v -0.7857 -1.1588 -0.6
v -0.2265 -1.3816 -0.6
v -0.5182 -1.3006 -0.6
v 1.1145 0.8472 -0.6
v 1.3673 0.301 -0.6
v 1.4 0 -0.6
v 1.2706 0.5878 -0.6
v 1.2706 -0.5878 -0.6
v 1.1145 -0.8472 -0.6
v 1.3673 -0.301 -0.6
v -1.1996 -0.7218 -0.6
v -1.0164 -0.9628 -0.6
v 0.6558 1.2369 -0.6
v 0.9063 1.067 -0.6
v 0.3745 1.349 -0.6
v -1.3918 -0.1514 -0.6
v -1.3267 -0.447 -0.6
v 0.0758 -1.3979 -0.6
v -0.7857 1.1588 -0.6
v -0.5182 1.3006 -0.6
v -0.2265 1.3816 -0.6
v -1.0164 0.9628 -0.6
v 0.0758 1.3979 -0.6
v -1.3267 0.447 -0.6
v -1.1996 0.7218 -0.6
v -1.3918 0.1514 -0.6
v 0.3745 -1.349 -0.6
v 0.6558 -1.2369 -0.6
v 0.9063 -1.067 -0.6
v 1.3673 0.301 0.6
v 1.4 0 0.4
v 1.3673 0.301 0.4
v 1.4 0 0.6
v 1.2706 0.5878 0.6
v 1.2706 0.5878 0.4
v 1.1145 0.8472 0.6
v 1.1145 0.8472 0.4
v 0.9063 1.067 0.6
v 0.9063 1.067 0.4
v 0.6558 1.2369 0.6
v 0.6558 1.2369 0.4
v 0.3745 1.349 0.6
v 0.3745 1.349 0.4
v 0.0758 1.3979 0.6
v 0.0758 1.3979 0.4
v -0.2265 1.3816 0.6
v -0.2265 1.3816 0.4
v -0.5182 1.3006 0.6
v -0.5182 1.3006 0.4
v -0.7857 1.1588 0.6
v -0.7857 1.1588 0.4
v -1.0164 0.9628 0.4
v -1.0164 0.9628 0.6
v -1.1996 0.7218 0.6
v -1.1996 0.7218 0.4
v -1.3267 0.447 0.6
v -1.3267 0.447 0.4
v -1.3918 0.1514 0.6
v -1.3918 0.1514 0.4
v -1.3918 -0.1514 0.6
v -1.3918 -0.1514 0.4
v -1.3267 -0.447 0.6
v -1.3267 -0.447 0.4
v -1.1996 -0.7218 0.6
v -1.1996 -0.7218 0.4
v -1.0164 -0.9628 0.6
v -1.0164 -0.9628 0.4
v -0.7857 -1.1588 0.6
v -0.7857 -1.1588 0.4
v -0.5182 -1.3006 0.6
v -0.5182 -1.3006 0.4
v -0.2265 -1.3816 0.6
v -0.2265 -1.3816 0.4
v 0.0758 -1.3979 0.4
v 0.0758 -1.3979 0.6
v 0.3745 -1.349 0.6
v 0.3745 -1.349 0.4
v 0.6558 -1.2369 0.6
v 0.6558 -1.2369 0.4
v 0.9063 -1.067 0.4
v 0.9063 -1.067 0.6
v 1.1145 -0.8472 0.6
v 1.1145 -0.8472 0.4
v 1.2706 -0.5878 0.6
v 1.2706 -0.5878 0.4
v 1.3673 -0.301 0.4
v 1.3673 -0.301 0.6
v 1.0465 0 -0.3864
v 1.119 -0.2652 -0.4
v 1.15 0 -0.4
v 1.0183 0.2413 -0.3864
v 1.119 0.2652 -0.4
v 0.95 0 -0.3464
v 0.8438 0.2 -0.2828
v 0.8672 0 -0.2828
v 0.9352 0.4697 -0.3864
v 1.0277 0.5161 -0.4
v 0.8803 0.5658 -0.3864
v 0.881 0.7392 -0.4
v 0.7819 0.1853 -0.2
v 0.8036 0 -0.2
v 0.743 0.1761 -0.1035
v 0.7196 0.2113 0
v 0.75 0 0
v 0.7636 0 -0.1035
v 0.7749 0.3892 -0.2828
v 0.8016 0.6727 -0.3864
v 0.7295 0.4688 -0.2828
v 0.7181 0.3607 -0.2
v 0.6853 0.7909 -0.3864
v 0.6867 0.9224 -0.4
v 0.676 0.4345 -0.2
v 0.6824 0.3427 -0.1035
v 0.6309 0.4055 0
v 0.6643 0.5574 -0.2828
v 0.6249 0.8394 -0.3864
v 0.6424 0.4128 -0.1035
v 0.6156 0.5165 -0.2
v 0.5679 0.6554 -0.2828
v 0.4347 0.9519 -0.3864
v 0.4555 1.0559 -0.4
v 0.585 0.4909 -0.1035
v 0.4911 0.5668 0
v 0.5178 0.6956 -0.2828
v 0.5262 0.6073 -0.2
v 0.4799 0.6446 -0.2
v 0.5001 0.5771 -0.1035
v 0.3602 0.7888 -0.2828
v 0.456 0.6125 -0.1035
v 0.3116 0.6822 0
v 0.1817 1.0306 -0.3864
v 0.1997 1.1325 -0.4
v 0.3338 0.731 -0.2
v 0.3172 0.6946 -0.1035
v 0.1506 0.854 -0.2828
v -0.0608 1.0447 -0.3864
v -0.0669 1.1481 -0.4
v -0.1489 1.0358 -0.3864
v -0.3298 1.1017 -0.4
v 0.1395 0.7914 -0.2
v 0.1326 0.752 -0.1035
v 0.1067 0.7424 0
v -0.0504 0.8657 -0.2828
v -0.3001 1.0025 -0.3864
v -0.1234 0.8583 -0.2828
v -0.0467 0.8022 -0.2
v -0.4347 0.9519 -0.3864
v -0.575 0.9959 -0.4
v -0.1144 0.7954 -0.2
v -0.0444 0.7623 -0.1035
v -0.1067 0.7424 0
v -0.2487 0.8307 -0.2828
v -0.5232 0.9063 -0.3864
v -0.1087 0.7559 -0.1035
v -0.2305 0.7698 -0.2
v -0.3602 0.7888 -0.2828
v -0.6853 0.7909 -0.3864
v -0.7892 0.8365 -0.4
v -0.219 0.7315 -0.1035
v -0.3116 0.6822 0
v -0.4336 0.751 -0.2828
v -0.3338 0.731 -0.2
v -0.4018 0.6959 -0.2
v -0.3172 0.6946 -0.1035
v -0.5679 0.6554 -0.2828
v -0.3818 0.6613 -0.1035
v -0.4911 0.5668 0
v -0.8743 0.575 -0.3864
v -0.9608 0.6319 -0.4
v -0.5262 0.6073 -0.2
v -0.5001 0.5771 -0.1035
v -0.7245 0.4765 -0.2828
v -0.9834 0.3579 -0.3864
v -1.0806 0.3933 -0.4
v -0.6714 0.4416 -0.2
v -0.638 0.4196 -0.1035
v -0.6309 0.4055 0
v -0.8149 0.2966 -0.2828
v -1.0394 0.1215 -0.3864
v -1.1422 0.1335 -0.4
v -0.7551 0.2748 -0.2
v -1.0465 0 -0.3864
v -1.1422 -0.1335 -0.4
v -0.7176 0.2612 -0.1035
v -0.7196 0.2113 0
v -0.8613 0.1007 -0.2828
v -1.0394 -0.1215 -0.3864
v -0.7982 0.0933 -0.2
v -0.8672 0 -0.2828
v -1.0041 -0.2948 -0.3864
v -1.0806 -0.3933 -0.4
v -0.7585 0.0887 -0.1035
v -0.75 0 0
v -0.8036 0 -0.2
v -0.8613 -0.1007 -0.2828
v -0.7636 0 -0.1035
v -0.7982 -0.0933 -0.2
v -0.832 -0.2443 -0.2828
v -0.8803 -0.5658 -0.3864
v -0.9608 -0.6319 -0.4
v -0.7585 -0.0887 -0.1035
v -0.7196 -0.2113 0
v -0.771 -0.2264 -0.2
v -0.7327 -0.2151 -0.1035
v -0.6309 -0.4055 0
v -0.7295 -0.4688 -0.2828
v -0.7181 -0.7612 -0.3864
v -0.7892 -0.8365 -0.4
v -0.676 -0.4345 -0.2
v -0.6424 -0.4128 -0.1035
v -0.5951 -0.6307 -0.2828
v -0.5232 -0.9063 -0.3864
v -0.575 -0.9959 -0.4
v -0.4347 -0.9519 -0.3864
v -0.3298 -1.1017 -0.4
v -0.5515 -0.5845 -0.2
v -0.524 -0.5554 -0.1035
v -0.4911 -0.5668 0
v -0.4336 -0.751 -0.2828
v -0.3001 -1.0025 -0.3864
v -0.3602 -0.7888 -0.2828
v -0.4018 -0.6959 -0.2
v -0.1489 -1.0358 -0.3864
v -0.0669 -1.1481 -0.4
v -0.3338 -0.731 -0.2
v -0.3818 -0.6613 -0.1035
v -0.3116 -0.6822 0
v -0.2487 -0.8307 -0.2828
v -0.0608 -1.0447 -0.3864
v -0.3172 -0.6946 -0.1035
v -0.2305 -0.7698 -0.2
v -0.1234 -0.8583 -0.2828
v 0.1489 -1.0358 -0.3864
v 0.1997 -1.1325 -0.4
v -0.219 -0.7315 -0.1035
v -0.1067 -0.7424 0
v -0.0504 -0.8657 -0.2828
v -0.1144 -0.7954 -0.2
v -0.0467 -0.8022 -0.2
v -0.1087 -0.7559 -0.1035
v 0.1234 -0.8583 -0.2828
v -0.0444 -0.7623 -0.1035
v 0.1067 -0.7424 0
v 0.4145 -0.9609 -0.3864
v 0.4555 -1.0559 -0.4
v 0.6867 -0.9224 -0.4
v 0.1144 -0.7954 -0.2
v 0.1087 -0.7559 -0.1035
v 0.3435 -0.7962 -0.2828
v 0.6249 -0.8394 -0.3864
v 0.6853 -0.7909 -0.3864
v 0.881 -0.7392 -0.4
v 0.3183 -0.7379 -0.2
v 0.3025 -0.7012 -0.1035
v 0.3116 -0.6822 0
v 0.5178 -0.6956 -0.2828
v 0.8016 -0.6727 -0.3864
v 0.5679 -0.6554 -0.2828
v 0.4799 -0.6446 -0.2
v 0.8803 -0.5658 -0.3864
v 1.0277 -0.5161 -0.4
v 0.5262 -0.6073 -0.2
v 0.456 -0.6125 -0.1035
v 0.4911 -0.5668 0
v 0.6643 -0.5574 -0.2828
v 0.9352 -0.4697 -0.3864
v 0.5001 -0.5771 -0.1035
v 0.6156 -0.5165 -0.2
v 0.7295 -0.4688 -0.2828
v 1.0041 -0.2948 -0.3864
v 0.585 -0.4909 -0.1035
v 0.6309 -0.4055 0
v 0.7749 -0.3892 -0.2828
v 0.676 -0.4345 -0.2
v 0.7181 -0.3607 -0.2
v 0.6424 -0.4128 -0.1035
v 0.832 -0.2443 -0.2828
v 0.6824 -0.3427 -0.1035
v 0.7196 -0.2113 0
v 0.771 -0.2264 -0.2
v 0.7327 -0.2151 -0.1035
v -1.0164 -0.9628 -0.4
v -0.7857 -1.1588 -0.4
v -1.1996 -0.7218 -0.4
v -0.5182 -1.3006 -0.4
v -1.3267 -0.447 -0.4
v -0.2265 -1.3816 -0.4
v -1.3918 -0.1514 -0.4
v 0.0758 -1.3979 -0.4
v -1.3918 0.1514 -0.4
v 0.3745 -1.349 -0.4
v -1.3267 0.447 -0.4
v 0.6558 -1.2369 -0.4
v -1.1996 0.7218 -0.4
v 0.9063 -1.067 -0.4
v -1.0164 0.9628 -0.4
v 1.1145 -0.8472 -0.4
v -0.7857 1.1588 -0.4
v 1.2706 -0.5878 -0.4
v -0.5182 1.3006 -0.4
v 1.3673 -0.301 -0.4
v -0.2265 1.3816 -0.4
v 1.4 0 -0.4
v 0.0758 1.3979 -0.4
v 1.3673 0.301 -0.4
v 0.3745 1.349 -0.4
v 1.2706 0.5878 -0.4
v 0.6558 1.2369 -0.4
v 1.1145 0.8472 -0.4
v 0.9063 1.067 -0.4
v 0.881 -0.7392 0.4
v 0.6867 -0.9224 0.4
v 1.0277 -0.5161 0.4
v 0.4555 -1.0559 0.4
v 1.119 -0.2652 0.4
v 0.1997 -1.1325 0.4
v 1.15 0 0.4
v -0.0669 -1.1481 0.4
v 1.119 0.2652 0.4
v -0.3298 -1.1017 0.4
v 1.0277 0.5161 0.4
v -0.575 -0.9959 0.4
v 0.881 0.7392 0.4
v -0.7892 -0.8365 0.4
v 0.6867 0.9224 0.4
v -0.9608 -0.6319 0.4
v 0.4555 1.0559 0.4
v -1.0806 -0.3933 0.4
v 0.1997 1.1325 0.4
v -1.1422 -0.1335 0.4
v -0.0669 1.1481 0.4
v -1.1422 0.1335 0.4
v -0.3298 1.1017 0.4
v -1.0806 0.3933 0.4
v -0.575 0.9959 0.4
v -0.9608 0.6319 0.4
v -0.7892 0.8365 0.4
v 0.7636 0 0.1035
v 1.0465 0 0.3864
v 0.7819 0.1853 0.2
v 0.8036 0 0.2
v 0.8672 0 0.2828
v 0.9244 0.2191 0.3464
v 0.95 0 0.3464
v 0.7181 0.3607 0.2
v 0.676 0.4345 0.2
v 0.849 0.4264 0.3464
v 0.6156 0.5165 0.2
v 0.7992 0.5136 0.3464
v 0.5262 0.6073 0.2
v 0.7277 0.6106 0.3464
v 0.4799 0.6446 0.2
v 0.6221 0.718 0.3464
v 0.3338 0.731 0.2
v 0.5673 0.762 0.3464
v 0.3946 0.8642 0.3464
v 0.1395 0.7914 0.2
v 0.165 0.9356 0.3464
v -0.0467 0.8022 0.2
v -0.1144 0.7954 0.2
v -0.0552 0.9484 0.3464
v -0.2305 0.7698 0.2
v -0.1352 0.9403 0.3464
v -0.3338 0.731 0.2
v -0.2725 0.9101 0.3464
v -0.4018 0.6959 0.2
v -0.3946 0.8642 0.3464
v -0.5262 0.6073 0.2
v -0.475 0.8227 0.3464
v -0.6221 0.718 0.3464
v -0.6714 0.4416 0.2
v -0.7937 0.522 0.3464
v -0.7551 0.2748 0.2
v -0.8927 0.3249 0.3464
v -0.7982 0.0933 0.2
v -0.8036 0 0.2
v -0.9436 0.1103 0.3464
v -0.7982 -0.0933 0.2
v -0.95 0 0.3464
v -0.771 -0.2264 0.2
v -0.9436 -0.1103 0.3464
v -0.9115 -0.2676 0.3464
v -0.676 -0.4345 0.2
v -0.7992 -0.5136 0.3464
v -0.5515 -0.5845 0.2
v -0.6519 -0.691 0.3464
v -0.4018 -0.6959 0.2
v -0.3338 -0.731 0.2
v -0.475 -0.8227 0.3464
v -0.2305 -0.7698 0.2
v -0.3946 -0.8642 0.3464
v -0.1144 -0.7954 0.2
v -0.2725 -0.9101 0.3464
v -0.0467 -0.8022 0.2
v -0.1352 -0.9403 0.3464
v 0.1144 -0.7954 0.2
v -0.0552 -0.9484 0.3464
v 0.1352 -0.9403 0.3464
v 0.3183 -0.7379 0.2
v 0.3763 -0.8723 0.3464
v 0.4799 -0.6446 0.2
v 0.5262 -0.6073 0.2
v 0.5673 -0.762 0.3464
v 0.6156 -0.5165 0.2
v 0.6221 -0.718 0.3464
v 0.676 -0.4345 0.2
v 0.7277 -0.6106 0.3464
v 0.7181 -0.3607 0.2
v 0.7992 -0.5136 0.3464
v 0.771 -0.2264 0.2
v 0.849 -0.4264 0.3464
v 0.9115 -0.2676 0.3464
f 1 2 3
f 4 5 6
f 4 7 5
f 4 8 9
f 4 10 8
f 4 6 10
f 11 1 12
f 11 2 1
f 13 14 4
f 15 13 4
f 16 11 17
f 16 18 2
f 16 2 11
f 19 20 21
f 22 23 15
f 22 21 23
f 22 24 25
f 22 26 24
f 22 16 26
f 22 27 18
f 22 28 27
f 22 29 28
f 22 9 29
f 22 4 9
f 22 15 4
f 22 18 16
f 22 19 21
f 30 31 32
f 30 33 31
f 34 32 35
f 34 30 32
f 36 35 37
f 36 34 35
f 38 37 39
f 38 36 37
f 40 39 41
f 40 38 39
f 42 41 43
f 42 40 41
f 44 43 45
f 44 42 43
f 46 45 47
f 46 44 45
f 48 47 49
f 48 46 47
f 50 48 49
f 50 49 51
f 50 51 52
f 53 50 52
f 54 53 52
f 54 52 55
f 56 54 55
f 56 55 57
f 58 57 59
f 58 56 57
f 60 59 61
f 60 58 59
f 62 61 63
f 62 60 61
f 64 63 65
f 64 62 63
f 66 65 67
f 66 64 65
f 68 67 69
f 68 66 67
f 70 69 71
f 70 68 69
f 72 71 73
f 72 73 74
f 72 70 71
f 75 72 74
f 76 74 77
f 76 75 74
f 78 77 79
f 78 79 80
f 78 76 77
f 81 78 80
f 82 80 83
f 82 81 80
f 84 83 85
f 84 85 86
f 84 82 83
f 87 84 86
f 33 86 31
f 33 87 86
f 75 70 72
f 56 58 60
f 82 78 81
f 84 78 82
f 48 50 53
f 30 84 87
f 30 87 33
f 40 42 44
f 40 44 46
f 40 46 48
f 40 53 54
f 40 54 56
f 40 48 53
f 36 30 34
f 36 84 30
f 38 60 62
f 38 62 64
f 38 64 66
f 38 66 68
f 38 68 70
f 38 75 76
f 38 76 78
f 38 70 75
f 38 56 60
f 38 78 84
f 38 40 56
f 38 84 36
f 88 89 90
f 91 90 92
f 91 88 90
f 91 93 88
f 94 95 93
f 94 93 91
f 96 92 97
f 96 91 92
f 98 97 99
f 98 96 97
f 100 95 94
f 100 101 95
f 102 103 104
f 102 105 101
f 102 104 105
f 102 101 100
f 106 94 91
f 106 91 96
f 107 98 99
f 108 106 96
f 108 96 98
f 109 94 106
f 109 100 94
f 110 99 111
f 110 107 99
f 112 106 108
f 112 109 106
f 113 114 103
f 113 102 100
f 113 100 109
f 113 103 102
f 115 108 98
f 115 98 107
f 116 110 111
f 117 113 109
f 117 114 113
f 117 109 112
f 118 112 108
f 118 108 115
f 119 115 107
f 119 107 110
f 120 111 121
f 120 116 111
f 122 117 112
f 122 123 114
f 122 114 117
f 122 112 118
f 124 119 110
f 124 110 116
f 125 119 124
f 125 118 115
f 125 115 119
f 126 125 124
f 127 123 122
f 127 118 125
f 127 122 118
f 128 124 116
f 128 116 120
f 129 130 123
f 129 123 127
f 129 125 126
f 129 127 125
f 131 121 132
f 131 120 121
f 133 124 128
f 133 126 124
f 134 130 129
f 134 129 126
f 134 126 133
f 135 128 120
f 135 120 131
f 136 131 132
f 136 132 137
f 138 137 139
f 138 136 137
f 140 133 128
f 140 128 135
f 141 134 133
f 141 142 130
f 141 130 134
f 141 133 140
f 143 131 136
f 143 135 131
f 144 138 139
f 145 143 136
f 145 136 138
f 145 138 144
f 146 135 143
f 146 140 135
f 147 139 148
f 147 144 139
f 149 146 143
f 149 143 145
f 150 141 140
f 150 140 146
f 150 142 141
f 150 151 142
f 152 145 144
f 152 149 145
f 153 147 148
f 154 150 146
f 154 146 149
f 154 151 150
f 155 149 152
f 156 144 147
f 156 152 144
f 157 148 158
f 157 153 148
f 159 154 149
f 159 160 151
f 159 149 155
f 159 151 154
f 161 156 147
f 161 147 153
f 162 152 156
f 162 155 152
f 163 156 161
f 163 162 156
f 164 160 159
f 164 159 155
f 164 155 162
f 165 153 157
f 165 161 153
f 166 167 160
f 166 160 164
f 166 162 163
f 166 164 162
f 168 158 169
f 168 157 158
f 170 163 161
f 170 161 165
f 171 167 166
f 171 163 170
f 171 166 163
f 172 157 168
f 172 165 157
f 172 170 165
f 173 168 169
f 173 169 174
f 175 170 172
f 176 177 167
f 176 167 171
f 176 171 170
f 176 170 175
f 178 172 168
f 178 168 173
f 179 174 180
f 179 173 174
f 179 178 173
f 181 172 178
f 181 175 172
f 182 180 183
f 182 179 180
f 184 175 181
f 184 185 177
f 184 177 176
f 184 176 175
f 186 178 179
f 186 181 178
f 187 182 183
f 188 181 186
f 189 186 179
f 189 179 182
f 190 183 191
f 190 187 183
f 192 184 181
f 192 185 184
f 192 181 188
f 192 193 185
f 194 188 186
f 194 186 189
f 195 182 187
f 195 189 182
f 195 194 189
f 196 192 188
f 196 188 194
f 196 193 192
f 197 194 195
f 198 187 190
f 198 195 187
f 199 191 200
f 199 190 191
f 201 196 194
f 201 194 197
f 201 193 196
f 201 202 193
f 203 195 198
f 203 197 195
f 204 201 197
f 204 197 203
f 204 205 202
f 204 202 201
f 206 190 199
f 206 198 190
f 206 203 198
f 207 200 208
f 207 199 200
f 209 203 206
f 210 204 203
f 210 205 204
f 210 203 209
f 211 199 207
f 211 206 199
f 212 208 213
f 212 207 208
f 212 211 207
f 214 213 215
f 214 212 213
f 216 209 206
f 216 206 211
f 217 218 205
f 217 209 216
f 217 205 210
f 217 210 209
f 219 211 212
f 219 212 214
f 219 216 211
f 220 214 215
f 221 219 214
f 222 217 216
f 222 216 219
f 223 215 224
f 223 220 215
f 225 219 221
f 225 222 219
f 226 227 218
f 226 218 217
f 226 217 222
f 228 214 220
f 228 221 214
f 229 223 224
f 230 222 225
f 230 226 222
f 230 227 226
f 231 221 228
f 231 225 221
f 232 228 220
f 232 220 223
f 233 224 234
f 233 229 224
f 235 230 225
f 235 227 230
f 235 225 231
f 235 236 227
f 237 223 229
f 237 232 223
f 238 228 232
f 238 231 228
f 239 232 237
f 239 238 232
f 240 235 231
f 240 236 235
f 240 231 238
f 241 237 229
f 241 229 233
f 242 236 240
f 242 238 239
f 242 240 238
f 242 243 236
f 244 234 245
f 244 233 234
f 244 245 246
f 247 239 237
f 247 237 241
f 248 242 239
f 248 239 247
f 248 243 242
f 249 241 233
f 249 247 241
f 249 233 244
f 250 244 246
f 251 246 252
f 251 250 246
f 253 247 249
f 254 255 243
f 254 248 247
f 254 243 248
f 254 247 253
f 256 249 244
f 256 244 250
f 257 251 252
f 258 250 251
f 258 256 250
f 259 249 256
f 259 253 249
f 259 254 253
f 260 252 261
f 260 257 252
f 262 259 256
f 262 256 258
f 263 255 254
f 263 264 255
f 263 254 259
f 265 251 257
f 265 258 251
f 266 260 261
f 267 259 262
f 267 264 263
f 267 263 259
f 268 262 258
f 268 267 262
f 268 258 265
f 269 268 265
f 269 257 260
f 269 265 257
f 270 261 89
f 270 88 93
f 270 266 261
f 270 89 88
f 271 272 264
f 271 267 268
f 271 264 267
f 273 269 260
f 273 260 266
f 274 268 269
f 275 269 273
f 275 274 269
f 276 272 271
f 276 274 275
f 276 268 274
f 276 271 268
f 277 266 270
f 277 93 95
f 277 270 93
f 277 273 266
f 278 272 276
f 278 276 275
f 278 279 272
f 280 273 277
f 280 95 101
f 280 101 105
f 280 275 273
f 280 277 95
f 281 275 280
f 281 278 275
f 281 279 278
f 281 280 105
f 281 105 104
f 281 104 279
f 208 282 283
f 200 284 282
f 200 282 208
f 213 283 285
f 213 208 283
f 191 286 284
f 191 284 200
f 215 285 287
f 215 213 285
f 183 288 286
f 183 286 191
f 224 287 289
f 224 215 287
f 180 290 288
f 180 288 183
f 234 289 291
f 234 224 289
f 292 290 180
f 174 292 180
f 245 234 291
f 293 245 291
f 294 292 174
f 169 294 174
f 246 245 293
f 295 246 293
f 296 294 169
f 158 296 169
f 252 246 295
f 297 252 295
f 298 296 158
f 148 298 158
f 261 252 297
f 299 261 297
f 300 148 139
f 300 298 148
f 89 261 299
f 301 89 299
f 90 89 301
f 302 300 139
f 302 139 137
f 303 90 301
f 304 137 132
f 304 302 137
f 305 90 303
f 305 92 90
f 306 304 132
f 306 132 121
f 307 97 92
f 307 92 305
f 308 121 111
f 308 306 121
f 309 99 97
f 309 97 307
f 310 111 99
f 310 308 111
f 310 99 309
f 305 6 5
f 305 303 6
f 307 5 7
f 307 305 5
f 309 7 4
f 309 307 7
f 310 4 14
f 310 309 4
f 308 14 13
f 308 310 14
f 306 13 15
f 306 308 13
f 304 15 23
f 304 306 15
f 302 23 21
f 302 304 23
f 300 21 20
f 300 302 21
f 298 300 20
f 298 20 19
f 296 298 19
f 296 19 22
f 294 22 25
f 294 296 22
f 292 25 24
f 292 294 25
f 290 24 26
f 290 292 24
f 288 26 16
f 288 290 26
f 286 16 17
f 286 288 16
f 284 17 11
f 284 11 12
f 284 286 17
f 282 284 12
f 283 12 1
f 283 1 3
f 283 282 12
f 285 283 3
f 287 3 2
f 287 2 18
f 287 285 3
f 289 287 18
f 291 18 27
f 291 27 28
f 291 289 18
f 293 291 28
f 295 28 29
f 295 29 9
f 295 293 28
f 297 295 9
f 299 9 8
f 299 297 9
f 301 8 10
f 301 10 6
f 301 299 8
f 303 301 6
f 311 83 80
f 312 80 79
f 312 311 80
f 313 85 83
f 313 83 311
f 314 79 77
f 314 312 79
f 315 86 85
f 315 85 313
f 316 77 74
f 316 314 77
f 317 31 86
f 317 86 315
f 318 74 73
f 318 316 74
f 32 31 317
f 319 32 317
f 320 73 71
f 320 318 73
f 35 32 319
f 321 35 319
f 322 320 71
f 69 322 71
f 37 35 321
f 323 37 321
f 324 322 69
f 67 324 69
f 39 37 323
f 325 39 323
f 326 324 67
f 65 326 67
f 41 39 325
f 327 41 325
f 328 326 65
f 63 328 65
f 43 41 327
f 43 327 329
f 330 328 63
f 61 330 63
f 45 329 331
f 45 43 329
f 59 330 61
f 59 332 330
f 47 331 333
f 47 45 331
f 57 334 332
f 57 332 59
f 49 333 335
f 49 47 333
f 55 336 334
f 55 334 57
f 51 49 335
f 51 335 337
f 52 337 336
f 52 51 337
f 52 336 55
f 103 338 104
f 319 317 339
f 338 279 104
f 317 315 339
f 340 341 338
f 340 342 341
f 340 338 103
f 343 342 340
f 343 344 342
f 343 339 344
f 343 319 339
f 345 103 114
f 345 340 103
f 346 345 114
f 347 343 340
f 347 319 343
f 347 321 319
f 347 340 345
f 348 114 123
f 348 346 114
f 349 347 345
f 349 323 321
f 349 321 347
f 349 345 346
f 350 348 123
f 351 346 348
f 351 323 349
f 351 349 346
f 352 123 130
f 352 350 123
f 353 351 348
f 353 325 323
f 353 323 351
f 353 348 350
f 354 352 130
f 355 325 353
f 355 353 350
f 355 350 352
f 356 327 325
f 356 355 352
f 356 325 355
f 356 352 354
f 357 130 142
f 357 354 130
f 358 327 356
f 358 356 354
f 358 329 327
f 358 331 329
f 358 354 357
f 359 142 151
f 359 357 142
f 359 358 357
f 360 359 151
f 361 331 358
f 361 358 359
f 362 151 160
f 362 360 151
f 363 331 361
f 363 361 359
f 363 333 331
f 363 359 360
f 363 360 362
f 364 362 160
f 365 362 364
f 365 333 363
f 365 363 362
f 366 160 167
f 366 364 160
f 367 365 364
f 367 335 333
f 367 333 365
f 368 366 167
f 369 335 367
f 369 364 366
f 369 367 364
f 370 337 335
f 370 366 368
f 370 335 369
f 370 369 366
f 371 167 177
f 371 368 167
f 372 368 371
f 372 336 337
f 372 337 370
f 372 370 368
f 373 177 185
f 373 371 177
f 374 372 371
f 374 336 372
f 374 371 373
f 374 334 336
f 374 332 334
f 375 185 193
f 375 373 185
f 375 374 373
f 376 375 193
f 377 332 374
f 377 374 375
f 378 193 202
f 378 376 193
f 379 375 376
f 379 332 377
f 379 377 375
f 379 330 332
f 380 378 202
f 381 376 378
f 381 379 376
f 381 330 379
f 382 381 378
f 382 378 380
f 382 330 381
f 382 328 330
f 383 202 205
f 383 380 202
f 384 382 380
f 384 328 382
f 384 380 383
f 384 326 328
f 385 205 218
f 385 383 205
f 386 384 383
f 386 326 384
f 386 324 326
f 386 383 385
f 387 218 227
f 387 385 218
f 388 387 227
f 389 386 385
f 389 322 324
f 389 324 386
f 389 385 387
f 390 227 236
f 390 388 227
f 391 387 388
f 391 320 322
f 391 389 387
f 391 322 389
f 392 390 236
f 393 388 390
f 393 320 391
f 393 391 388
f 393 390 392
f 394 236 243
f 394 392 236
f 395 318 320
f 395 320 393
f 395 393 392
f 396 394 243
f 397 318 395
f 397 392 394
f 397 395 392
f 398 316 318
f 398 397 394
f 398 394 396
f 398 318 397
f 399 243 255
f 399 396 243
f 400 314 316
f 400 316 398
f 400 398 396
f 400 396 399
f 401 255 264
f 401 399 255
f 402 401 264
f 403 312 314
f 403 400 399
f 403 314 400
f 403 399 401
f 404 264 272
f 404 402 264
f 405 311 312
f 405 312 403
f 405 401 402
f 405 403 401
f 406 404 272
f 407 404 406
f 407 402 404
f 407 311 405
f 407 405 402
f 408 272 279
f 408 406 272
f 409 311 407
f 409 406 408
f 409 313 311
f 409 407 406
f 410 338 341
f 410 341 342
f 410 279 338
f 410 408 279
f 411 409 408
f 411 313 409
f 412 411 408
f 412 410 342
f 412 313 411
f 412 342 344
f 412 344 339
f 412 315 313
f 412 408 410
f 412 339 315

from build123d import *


with BuildPart() as f1:
    # F0 (on Front) → F1 (revolve)
    with BuildSketch(Plane.XZ):
        with BuildLine():
            Line((1.4, 0.6), (0, 0.6))
            Line((0, 0.6), (0, 0))
            Line((0, 0), (0, -0.6))
            Line((0, -0.6), (1.4, -0.6))
            Line((1.4, -0.6), (1.4, -0.4))
            Line((1.4, -0.4), (1.15, -0.4))
            ThreePointArc((1.15, -0.4), (0.867157, -0.282843), (0.75, 0))
            ThreePointArc((0.75, 0), (0.867157, 0.282843), (1.15, 0.4))
            Line((1.15, 0.4), (1.4, 0.4))
            Line((1.4, 0.4), (1.4, 0.6))
        make_face()
    revolve(axis=Axis((0, 0, 0.3), (0, 0, 1)))


solid = f1.part
